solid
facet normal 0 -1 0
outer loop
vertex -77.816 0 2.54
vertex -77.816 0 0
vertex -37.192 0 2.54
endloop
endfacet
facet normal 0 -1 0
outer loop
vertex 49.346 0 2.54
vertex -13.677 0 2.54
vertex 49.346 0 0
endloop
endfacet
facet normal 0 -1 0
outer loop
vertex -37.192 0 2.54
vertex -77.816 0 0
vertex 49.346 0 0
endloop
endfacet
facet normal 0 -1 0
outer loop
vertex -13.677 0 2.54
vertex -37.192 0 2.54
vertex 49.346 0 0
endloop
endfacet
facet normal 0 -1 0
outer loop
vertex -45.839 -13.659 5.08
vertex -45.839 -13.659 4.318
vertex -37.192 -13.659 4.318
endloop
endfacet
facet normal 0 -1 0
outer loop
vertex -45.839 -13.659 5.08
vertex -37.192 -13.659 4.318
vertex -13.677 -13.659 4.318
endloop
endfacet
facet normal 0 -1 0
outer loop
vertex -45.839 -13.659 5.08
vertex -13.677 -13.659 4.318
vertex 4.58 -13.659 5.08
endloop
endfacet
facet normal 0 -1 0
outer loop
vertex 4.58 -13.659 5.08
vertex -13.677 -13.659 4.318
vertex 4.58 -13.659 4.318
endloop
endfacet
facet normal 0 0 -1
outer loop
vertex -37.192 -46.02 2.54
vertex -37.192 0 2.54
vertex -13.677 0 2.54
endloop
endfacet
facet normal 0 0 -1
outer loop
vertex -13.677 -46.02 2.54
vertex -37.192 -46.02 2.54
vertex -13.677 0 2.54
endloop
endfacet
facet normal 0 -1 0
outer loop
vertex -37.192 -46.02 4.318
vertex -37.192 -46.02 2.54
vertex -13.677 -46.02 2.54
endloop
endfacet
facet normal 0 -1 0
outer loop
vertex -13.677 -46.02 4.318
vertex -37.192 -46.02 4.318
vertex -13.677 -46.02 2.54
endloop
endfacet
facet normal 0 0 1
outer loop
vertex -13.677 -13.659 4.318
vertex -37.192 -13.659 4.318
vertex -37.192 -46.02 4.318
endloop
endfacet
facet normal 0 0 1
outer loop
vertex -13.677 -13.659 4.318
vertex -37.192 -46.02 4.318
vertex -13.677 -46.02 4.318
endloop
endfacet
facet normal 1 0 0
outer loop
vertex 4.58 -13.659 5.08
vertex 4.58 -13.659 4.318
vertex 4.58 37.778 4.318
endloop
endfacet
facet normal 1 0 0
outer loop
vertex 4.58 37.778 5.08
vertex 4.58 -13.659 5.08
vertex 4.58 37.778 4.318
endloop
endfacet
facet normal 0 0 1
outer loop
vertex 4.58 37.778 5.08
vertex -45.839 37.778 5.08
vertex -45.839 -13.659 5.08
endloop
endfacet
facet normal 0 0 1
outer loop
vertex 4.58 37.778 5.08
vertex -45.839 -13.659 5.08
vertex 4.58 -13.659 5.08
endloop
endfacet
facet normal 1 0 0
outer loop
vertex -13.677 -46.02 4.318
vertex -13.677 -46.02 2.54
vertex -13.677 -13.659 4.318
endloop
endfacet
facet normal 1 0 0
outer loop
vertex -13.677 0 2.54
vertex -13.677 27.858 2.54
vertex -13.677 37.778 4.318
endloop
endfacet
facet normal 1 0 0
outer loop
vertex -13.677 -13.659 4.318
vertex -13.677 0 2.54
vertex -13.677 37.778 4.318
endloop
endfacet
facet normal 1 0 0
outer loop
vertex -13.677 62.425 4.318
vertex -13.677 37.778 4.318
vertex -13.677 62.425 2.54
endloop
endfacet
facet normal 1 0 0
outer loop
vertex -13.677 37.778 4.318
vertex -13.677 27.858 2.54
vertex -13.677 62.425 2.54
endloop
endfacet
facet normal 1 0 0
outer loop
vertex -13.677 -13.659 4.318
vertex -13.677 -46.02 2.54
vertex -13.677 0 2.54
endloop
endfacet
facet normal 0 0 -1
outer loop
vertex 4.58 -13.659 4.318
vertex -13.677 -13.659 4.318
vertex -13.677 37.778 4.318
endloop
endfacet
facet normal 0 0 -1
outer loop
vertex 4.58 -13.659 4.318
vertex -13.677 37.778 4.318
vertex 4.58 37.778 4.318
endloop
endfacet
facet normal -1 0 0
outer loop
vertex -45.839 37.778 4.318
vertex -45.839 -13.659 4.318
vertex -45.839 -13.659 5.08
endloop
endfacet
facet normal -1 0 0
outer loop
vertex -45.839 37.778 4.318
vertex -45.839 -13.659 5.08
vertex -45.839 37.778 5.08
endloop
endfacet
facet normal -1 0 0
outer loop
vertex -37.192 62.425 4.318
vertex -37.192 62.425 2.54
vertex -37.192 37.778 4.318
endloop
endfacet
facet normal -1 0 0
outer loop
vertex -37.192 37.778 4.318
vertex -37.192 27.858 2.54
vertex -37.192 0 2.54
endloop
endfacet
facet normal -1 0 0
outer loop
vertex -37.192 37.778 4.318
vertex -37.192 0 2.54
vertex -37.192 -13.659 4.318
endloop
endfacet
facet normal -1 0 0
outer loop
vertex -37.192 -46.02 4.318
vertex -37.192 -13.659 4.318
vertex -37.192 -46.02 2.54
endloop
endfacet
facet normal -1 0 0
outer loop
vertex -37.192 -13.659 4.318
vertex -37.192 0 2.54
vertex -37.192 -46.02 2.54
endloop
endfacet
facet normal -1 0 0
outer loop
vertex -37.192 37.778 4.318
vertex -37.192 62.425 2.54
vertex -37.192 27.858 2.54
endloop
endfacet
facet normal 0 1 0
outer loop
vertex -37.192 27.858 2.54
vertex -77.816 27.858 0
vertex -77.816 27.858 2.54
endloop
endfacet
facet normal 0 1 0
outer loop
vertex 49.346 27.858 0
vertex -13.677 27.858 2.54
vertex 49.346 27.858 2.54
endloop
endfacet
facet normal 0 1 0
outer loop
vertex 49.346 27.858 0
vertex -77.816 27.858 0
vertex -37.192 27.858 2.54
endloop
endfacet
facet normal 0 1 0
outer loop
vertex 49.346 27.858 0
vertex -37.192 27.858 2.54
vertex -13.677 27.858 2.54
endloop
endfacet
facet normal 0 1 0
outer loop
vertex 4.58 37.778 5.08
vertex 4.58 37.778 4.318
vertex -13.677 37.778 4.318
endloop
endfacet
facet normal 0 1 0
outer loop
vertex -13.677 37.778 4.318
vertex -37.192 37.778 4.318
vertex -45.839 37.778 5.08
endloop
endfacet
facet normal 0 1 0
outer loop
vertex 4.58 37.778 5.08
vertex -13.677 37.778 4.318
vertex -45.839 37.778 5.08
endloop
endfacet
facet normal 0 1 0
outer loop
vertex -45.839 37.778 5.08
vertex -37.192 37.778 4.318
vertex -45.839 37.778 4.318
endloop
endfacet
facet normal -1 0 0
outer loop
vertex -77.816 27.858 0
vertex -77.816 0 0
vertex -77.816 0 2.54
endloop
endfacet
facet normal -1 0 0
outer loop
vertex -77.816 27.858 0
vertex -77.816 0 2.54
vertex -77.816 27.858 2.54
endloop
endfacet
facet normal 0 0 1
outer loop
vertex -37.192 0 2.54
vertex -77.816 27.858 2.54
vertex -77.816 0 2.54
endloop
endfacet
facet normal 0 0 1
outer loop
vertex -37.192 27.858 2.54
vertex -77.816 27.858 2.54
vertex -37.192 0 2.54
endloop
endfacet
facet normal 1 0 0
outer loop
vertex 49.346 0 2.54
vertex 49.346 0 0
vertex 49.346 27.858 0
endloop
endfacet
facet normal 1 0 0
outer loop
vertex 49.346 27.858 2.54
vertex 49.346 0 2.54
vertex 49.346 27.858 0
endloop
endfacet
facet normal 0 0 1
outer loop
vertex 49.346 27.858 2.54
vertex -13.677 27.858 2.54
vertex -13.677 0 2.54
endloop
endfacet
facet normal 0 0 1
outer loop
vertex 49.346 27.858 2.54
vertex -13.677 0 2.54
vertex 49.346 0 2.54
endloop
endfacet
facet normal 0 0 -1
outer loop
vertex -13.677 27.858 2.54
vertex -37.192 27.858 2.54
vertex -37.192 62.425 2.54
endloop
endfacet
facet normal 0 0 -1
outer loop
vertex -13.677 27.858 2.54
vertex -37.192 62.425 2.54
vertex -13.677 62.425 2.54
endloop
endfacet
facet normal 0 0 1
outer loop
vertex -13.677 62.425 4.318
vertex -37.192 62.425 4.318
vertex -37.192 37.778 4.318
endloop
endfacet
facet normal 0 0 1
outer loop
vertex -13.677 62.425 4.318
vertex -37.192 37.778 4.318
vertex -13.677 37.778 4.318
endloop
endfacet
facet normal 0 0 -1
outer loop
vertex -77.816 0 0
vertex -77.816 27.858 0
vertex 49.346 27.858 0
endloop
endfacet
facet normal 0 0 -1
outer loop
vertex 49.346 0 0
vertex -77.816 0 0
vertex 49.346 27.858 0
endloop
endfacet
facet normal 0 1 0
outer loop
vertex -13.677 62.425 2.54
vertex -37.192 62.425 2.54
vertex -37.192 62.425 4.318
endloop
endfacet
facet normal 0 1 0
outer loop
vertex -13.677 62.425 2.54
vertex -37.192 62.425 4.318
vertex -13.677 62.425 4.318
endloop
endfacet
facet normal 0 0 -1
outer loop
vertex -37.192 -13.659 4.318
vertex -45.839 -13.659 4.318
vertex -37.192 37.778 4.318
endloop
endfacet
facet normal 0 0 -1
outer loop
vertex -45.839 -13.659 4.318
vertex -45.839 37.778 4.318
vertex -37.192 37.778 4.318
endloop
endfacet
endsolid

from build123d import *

# Parameters (mm, degrees)
F0_W     = 127.1624974906
F0_H     = 27.8577823192
F1_DEPTH = 2.54
F2_W     = 23.5141962767
F2_H     = 27.8577823192
F2_H_2   = 46.019657515
F2_H_3   = 34.5669230446
F3_DEPTH = 1.778
F4_W     = 18.2572918436
F4_H     = 51.4373374962
F4_W_2   = 23.5141962767
F4_W_3   = 8.6478181183
F5_DEPTH = 0.762


with BuildPart() as f1:
    # F0 (on Top) → F1 (new body)
    with BuildSketch(Plane.XY):
        with Locations((-14.2351035029, 13.9288911596)):
            Rectangle(F0_W, F0_H)
    extrude(amount=F1_DEPTH)

    # F2 (on face) → F3 (join)
    with BuildSketch(Plane.XY.offset(2.54)):
        with Locations((-25.4345647991, 13.9288911596)):
            Rectangle(F2_W, F2_H)
        with Locations((-25.4345647991, -23.0098287575)):
            Rectangle(F2_W, F2_H_2)
        with Locations((-25.4345647991, 45.1412438415)):
            Rectangle(F2_W, F2_H_3)
    extrude(amount=F3_DEPTH)

    # F4 (on face) → F5 (join)
    with BuildSketch(Plane.XY.offset(4.318)):
        with Locations((-4.5488207389, 12.0593749848)):
            Rectangle(F4_W, F4_H)
        with Locations((-25.4345647991, 12.0593749848)):
            Rectangle(F4_W_2, F4_H)
        with Locations((-41.5155719966, 12.0593749848)):
            Rectangle(F4_W_3, F4_H)
    extrude(amount=F5_DEPTH)


solid = f1.part
